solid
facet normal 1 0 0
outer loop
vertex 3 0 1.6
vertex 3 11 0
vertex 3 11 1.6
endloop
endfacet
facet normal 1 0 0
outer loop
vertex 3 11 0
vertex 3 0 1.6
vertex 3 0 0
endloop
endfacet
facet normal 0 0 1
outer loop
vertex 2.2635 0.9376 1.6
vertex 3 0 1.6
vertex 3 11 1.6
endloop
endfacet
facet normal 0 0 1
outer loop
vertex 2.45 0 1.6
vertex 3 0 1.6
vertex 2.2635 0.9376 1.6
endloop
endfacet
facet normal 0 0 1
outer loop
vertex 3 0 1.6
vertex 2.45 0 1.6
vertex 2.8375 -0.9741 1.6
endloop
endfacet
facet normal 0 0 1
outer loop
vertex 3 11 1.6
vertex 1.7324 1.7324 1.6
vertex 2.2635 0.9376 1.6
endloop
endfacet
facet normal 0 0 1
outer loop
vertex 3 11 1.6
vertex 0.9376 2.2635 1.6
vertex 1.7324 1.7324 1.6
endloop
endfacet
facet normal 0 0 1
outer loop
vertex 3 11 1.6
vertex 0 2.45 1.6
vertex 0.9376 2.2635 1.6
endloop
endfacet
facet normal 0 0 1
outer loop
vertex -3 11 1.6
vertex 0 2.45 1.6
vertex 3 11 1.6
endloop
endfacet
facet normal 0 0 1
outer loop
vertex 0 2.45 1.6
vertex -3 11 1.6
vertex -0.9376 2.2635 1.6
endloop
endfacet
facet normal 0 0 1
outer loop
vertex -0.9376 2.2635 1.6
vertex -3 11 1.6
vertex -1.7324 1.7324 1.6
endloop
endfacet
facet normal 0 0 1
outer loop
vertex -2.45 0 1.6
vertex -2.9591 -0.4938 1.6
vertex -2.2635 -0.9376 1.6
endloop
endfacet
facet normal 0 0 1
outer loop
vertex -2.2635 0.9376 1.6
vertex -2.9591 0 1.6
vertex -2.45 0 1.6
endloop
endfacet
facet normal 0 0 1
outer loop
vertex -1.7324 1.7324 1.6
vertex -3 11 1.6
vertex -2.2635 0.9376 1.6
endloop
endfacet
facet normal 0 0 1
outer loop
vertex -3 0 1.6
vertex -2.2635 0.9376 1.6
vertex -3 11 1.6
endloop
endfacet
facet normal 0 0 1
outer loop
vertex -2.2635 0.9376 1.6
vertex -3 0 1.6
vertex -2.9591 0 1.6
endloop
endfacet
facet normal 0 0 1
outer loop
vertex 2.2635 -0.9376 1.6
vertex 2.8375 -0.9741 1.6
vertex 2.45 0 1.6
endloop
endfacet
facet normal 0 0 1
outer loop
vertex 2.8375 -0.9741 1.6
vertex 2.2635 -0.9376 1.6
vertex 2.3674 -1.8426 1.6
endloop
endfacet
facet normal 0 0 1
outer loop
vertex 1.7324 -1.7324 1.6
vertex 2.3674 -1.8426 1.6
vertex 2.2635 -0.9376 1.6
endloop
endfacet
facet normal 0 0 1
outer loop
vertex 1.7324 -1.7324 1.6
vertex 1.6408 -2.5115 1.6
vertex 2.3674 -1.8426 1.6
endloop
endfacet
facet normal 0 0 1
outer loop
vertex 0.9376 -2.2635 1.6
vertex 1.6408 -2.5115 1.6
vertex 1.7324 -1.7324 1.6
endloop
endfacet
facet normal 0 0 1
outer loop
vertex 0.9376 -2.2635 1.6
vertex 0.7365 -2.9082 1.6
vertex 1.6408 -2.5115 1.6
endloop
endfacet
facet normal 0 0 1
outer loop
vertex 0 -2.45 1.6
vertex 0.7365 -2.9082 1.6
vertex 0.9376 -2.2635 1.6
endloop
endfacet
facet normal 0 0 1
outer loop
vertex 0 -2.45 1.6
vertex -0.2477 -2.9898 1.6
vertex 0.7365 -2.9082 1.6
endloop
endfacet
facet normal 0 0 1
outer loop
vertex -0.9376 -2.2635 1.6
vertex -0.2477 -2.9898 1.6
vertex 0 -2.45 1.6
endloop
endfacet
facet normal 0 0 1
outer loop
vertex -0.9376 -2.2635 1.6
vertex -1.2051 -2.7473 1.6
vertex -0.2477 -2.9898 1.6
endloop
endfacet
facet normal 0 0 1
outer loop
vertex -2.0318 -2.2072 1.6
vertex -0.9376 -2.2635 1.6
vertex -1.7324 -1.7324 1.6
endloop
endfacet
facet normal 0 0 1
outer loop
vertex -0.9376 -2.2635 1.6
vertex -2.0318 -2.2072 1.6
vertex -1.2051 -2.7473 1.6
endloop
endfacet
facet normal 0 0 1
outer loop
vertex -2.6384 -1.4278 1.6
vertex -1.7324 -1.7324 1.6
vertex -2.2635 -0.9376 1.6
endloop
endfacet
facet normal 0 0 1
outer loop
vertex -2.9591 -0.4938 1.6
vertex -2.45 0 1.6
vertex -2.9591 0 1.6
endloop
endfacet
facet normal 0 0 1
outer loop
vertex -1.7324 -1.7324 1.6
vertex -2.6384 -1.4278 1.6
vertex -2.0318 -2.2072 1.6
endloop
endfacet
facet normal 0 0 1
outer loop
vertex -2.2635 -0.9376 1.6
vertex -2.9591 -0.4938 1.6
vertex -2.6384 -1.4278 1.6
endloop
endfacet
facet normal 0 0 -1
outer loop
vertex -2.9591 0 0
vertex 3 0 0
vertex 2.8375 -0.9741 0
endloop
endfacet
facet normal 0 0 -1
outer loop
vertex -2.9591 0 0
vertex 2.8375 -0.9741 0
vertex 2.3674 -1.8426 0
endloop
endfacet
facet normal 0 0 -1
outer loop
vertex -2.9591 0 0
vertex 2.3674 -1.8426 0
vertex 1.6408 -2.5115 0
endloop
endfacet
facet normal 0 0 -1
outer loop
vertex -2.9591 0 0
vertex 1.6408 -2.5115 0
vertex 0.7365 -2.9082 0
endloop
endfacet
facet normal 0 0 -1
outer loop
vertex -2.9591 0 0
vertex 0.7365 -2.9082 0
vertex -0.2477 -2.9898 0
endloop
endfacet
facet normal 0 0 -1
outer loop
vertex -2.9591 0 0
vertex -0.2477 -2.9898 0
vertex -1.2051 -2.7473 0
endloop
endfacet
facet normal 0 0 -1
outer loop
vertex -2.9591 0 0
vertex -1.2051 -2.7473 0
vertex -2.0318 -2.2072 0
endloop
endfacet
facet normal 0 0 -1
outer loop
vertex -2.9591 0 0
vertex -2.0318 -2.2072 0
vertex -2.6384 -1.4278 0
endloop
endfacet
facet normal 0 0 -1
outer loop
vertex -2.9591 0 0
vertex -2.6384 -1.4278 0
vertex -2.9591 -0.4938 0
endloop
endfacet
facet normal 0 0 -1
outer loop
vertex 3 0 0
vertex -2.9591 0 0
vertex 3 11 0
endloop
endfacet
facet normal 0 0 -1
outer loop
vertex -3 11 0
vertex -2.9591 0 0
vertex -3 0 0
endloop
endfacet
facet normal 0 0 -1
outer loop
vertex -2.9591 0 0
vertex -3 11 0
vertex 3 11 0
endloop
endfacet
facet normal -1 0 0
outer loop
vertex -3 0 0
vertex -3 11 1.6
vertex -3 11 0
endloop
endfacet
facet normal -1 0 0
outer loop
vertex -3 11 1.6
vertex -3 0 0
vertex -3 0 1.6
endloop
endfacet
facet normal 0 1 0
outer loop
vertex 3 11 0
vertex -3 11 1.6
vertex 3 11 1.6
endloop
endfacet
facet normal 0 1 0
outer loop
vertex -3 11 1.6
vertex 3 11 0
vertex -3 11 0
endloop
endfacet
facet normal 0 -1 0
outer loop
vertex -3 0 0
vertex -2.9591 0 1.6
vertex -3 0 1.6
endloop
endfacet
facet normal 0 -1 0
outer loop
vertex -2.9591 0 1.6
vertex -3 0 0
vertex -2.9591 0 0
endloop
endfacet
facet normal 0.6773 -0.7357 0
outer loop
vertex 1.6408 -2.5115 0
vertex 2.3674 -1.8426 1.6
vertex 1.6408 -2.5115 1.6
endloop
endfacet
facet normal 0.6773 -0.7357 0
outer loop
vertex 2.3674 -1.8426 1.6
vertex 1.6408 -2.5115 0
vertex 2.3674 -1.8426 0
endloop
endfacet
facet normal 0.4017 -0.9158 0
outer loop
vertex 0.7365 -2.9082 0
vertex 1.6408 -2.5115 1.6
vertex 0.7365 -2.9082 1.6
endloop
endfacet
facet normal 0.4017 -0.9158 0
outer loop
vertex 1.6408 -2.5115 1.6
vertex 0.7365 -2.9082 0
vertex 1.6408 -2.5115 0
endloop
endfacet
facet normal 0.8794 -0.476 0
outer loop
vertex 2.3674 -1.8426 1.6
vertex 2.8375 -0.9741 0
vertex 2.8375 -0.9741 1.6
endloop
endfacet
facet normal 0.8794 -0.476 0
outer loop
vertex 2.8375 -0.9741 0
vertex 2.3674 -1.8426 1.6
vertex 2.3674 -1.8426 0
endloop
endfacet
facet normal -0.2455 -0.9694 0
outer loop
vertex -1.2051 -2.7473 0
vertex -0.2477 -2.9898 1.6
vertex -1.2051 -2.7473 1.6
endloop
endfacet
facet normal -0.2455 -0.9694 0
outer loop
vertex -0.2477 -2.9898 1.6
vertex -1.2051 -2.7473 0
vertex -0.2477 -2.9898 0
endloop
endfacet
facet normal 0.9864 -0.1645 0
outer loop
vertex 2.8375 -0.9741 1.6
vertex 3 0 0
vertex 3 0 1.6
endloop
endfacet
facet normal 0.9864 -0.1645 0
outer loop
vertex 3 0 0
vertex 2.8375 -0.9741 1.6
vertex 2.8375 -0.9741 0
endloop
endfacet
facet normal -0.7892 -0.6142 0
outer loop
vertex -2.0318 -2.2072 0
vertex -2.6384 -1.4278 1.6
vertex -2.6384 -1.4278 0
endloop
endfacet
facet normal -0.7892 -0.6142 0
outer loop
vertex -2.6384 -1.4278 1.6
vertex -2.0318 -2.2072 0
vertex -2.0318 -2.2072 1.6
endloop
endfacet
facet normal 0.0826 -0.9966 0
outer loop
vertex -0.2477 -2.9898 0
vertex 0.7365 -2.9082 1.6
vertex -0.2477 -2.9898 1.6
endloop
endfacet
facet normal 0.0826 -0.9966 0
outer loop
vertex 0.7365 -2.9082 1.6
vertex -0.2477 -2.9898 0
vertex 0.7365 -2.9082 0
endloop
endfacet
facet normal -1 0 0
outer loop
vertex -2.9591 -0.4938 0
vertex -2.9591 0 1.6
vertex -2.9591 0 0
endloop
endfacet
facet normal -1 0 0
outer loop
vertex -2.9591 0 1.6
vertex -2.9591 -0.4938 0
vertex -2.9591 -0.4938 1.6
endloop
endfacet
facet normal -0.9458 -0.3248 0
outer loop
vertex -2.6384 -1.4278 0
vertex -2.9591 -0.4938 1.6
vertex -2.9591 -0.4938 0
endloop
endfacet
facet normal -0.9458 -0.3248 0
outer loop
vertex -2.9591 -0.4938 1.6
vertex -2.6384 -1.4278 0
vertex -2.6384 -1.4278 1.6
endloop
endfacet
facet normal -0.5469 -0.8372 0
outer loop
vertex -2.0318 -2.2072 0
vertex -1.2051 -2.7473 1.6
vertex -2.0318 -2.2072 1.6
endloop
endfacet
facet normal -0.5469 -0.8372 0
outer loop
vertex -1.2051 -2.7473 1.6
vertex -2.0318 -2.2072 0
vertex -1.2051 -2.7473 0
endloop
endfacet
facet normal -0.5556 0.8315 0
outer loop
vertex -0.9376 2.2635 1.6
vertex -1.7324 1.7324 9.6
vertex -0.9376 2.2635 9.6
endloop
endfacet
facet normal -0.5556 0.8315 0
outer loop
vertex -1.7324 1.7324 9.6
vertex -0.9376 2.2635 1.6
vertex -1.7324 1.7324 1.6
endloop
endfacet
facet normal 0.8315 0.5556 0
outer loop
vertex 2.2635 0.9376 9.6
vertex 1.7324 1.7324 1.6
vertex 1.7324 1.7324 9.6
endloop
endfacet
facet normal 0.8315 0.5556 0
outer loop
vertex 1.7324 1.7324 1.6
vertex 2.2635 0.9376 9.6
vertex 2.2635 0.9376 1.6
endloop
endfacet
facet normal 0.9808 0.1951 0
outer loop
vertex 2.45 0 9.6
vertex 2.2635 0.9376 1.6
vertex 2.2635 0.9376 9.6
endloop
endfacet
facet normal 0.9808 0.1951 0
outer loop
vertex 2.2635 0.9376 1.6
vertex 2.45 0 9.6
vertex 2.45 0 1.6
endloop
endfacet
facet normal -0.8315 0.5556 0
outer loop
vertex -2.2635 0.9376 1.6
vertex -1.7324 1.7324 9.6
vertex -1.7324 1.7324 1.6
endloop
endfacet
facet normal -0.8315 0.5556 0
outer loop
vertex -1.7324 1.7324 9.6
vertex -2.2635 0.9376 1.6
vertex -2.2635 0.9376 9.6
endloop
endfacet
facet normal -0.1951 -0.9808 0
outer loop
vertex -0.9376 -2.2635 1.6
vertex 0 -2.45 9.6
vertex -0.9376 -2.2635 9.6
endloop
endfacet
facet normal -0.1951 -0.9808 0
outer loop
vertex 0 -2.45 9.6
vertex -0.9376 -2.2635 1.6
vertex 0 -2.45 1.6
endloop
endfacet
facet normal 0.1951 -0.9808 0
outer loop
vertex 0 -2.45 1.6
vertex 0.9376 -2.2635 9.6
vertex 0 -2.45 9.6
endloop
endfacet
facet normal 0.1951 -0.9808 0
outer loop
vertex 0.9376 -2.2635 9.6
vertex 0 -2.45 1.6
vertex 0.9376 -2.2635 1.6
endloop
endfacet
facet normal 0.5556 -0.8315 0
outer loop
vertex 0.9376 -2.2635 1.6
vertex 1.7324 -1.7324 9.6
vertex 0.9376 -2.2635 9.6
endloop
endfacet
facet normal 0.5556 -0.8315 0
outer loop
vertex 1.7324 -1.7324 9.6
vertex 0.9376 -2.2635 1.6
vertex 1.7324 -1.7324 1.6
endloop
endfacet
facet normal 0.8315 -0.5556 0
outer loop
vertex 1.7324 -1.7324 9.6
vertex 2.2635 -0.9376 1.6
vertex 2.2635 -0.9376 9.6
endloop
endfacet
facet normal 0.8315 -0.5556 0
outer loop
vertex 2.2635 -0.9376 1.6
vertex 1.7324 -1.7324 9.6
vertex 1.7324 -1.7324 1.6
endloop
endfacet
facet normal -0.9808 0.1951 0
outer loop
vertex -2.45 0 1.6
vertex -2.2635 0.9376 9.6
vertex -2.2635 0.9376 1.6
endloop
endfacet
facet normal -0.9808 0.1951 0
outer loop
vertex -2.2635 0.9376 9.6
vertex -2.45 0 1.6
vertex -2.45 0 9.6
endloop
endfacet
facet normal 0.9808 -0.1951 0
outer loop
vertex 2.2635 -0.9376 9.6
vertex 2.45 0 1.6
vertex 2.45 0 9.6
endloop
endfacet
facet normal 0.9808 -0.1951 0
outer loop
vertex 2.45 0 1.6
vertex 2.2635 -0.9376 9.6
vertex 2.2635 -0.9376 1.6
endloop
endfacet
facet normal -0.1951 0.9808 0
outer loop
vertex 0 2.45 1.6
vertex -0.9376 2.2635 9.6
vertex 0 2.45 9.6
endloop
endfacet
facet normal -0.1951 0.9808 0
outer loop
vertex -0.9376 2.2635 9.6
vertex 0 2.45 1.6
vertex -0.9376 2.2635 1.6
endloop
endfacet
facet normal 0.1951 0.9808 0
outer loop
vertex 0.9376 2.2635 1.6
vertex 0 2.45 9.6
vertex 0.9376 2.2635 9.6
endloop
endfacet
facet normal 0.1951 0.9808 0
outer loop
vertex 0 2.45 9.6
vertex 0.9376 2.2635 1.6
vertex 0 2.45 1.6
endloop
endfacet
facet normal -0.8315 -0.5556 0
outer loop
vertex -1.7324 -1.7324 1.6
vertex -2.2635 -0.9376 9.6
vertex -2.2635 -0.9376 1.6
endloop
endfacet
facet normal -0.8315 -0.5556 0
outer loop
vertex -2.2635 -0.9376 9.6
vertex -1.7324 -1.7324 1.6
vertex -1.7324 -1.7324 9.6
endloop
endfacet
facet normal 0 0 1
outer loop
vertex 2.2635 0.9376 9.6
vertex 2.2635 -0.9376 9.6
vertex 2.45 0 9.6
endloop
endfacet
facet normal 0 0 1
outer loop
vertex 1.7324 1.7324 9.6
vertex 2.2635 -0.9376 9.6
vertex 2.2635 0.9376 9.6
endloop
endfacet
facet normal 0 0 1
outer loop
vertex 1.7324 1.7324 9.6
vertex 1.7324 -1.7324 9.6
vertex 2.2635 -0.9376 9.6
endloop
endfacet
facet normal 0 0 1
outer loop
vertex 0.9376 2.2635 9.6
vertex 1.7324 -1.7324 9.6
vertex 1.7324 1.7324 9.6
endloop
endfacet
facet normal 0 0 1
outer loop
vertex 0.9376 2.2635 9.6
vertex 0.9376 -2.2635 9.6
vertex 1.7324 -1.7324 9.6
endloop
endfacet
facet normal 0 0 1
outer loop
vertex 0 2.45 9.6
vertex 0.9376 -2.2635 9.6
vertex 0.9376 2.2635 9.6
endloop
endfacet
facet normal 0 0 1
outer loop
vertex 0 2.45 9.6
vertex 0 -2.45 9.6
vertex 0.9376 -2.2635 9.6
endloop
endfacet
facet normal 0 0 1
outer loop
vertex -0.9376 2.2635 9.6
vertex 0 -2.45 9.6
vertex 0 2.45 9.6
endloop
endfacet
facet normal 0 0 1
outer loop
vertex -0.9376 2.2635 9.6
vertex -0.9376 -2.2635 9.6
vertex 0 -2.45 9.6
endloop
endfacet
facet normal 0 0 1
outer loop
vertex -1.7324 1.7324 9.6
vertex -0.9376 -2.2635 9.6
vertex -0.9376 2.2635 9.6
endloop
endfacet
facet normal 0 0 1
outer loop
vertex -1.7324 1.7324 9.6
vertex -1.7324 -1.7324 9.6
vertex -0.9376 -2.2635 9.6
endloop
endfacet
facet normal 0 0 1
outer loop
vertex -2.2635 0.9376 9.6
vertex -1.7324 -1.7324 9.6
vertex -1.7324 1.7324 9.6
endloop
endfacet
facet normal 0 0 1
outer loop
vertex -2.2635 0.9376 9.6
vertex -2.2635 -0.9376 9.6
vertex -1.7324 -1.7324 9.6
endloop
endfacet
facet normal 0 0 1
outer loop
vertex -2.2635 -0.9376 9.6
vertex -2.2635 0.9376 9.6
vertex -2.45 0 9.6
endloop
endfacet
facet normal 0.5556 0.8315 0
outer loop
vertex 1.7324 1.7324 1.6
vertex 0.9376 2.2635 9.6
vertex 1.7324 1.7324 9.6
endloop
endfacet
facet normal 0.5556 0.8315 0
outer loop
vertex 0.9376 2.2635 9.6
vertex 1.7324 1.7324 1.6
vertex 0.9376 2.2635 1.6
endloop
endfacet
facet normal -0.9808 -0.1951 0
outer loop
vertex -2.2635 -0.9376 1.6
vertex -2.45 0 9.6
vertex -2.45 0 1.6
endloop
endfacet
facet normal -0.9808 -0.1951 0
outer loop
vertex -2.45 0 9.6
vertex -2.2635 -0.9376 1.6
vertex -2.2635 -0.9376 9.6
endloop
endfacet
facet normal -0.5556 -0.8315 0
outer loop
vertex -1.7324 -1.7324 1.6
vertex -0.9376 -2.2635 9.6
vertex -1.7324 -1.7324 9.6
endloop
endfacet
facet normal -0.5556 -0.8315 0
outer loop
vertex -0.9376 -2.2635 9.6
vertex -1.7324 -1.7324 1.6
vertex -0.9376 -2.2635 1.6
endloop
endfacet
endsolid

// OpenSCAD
    translate([-3,0,0])
    cube([6,11,1.6]);
    cylinder(h = 1.6, r = 3.00, $fs = 1);
    translate([0,0,1.6])
    cylinder (h = 8, r = 4.9/2, $fs = 1);
